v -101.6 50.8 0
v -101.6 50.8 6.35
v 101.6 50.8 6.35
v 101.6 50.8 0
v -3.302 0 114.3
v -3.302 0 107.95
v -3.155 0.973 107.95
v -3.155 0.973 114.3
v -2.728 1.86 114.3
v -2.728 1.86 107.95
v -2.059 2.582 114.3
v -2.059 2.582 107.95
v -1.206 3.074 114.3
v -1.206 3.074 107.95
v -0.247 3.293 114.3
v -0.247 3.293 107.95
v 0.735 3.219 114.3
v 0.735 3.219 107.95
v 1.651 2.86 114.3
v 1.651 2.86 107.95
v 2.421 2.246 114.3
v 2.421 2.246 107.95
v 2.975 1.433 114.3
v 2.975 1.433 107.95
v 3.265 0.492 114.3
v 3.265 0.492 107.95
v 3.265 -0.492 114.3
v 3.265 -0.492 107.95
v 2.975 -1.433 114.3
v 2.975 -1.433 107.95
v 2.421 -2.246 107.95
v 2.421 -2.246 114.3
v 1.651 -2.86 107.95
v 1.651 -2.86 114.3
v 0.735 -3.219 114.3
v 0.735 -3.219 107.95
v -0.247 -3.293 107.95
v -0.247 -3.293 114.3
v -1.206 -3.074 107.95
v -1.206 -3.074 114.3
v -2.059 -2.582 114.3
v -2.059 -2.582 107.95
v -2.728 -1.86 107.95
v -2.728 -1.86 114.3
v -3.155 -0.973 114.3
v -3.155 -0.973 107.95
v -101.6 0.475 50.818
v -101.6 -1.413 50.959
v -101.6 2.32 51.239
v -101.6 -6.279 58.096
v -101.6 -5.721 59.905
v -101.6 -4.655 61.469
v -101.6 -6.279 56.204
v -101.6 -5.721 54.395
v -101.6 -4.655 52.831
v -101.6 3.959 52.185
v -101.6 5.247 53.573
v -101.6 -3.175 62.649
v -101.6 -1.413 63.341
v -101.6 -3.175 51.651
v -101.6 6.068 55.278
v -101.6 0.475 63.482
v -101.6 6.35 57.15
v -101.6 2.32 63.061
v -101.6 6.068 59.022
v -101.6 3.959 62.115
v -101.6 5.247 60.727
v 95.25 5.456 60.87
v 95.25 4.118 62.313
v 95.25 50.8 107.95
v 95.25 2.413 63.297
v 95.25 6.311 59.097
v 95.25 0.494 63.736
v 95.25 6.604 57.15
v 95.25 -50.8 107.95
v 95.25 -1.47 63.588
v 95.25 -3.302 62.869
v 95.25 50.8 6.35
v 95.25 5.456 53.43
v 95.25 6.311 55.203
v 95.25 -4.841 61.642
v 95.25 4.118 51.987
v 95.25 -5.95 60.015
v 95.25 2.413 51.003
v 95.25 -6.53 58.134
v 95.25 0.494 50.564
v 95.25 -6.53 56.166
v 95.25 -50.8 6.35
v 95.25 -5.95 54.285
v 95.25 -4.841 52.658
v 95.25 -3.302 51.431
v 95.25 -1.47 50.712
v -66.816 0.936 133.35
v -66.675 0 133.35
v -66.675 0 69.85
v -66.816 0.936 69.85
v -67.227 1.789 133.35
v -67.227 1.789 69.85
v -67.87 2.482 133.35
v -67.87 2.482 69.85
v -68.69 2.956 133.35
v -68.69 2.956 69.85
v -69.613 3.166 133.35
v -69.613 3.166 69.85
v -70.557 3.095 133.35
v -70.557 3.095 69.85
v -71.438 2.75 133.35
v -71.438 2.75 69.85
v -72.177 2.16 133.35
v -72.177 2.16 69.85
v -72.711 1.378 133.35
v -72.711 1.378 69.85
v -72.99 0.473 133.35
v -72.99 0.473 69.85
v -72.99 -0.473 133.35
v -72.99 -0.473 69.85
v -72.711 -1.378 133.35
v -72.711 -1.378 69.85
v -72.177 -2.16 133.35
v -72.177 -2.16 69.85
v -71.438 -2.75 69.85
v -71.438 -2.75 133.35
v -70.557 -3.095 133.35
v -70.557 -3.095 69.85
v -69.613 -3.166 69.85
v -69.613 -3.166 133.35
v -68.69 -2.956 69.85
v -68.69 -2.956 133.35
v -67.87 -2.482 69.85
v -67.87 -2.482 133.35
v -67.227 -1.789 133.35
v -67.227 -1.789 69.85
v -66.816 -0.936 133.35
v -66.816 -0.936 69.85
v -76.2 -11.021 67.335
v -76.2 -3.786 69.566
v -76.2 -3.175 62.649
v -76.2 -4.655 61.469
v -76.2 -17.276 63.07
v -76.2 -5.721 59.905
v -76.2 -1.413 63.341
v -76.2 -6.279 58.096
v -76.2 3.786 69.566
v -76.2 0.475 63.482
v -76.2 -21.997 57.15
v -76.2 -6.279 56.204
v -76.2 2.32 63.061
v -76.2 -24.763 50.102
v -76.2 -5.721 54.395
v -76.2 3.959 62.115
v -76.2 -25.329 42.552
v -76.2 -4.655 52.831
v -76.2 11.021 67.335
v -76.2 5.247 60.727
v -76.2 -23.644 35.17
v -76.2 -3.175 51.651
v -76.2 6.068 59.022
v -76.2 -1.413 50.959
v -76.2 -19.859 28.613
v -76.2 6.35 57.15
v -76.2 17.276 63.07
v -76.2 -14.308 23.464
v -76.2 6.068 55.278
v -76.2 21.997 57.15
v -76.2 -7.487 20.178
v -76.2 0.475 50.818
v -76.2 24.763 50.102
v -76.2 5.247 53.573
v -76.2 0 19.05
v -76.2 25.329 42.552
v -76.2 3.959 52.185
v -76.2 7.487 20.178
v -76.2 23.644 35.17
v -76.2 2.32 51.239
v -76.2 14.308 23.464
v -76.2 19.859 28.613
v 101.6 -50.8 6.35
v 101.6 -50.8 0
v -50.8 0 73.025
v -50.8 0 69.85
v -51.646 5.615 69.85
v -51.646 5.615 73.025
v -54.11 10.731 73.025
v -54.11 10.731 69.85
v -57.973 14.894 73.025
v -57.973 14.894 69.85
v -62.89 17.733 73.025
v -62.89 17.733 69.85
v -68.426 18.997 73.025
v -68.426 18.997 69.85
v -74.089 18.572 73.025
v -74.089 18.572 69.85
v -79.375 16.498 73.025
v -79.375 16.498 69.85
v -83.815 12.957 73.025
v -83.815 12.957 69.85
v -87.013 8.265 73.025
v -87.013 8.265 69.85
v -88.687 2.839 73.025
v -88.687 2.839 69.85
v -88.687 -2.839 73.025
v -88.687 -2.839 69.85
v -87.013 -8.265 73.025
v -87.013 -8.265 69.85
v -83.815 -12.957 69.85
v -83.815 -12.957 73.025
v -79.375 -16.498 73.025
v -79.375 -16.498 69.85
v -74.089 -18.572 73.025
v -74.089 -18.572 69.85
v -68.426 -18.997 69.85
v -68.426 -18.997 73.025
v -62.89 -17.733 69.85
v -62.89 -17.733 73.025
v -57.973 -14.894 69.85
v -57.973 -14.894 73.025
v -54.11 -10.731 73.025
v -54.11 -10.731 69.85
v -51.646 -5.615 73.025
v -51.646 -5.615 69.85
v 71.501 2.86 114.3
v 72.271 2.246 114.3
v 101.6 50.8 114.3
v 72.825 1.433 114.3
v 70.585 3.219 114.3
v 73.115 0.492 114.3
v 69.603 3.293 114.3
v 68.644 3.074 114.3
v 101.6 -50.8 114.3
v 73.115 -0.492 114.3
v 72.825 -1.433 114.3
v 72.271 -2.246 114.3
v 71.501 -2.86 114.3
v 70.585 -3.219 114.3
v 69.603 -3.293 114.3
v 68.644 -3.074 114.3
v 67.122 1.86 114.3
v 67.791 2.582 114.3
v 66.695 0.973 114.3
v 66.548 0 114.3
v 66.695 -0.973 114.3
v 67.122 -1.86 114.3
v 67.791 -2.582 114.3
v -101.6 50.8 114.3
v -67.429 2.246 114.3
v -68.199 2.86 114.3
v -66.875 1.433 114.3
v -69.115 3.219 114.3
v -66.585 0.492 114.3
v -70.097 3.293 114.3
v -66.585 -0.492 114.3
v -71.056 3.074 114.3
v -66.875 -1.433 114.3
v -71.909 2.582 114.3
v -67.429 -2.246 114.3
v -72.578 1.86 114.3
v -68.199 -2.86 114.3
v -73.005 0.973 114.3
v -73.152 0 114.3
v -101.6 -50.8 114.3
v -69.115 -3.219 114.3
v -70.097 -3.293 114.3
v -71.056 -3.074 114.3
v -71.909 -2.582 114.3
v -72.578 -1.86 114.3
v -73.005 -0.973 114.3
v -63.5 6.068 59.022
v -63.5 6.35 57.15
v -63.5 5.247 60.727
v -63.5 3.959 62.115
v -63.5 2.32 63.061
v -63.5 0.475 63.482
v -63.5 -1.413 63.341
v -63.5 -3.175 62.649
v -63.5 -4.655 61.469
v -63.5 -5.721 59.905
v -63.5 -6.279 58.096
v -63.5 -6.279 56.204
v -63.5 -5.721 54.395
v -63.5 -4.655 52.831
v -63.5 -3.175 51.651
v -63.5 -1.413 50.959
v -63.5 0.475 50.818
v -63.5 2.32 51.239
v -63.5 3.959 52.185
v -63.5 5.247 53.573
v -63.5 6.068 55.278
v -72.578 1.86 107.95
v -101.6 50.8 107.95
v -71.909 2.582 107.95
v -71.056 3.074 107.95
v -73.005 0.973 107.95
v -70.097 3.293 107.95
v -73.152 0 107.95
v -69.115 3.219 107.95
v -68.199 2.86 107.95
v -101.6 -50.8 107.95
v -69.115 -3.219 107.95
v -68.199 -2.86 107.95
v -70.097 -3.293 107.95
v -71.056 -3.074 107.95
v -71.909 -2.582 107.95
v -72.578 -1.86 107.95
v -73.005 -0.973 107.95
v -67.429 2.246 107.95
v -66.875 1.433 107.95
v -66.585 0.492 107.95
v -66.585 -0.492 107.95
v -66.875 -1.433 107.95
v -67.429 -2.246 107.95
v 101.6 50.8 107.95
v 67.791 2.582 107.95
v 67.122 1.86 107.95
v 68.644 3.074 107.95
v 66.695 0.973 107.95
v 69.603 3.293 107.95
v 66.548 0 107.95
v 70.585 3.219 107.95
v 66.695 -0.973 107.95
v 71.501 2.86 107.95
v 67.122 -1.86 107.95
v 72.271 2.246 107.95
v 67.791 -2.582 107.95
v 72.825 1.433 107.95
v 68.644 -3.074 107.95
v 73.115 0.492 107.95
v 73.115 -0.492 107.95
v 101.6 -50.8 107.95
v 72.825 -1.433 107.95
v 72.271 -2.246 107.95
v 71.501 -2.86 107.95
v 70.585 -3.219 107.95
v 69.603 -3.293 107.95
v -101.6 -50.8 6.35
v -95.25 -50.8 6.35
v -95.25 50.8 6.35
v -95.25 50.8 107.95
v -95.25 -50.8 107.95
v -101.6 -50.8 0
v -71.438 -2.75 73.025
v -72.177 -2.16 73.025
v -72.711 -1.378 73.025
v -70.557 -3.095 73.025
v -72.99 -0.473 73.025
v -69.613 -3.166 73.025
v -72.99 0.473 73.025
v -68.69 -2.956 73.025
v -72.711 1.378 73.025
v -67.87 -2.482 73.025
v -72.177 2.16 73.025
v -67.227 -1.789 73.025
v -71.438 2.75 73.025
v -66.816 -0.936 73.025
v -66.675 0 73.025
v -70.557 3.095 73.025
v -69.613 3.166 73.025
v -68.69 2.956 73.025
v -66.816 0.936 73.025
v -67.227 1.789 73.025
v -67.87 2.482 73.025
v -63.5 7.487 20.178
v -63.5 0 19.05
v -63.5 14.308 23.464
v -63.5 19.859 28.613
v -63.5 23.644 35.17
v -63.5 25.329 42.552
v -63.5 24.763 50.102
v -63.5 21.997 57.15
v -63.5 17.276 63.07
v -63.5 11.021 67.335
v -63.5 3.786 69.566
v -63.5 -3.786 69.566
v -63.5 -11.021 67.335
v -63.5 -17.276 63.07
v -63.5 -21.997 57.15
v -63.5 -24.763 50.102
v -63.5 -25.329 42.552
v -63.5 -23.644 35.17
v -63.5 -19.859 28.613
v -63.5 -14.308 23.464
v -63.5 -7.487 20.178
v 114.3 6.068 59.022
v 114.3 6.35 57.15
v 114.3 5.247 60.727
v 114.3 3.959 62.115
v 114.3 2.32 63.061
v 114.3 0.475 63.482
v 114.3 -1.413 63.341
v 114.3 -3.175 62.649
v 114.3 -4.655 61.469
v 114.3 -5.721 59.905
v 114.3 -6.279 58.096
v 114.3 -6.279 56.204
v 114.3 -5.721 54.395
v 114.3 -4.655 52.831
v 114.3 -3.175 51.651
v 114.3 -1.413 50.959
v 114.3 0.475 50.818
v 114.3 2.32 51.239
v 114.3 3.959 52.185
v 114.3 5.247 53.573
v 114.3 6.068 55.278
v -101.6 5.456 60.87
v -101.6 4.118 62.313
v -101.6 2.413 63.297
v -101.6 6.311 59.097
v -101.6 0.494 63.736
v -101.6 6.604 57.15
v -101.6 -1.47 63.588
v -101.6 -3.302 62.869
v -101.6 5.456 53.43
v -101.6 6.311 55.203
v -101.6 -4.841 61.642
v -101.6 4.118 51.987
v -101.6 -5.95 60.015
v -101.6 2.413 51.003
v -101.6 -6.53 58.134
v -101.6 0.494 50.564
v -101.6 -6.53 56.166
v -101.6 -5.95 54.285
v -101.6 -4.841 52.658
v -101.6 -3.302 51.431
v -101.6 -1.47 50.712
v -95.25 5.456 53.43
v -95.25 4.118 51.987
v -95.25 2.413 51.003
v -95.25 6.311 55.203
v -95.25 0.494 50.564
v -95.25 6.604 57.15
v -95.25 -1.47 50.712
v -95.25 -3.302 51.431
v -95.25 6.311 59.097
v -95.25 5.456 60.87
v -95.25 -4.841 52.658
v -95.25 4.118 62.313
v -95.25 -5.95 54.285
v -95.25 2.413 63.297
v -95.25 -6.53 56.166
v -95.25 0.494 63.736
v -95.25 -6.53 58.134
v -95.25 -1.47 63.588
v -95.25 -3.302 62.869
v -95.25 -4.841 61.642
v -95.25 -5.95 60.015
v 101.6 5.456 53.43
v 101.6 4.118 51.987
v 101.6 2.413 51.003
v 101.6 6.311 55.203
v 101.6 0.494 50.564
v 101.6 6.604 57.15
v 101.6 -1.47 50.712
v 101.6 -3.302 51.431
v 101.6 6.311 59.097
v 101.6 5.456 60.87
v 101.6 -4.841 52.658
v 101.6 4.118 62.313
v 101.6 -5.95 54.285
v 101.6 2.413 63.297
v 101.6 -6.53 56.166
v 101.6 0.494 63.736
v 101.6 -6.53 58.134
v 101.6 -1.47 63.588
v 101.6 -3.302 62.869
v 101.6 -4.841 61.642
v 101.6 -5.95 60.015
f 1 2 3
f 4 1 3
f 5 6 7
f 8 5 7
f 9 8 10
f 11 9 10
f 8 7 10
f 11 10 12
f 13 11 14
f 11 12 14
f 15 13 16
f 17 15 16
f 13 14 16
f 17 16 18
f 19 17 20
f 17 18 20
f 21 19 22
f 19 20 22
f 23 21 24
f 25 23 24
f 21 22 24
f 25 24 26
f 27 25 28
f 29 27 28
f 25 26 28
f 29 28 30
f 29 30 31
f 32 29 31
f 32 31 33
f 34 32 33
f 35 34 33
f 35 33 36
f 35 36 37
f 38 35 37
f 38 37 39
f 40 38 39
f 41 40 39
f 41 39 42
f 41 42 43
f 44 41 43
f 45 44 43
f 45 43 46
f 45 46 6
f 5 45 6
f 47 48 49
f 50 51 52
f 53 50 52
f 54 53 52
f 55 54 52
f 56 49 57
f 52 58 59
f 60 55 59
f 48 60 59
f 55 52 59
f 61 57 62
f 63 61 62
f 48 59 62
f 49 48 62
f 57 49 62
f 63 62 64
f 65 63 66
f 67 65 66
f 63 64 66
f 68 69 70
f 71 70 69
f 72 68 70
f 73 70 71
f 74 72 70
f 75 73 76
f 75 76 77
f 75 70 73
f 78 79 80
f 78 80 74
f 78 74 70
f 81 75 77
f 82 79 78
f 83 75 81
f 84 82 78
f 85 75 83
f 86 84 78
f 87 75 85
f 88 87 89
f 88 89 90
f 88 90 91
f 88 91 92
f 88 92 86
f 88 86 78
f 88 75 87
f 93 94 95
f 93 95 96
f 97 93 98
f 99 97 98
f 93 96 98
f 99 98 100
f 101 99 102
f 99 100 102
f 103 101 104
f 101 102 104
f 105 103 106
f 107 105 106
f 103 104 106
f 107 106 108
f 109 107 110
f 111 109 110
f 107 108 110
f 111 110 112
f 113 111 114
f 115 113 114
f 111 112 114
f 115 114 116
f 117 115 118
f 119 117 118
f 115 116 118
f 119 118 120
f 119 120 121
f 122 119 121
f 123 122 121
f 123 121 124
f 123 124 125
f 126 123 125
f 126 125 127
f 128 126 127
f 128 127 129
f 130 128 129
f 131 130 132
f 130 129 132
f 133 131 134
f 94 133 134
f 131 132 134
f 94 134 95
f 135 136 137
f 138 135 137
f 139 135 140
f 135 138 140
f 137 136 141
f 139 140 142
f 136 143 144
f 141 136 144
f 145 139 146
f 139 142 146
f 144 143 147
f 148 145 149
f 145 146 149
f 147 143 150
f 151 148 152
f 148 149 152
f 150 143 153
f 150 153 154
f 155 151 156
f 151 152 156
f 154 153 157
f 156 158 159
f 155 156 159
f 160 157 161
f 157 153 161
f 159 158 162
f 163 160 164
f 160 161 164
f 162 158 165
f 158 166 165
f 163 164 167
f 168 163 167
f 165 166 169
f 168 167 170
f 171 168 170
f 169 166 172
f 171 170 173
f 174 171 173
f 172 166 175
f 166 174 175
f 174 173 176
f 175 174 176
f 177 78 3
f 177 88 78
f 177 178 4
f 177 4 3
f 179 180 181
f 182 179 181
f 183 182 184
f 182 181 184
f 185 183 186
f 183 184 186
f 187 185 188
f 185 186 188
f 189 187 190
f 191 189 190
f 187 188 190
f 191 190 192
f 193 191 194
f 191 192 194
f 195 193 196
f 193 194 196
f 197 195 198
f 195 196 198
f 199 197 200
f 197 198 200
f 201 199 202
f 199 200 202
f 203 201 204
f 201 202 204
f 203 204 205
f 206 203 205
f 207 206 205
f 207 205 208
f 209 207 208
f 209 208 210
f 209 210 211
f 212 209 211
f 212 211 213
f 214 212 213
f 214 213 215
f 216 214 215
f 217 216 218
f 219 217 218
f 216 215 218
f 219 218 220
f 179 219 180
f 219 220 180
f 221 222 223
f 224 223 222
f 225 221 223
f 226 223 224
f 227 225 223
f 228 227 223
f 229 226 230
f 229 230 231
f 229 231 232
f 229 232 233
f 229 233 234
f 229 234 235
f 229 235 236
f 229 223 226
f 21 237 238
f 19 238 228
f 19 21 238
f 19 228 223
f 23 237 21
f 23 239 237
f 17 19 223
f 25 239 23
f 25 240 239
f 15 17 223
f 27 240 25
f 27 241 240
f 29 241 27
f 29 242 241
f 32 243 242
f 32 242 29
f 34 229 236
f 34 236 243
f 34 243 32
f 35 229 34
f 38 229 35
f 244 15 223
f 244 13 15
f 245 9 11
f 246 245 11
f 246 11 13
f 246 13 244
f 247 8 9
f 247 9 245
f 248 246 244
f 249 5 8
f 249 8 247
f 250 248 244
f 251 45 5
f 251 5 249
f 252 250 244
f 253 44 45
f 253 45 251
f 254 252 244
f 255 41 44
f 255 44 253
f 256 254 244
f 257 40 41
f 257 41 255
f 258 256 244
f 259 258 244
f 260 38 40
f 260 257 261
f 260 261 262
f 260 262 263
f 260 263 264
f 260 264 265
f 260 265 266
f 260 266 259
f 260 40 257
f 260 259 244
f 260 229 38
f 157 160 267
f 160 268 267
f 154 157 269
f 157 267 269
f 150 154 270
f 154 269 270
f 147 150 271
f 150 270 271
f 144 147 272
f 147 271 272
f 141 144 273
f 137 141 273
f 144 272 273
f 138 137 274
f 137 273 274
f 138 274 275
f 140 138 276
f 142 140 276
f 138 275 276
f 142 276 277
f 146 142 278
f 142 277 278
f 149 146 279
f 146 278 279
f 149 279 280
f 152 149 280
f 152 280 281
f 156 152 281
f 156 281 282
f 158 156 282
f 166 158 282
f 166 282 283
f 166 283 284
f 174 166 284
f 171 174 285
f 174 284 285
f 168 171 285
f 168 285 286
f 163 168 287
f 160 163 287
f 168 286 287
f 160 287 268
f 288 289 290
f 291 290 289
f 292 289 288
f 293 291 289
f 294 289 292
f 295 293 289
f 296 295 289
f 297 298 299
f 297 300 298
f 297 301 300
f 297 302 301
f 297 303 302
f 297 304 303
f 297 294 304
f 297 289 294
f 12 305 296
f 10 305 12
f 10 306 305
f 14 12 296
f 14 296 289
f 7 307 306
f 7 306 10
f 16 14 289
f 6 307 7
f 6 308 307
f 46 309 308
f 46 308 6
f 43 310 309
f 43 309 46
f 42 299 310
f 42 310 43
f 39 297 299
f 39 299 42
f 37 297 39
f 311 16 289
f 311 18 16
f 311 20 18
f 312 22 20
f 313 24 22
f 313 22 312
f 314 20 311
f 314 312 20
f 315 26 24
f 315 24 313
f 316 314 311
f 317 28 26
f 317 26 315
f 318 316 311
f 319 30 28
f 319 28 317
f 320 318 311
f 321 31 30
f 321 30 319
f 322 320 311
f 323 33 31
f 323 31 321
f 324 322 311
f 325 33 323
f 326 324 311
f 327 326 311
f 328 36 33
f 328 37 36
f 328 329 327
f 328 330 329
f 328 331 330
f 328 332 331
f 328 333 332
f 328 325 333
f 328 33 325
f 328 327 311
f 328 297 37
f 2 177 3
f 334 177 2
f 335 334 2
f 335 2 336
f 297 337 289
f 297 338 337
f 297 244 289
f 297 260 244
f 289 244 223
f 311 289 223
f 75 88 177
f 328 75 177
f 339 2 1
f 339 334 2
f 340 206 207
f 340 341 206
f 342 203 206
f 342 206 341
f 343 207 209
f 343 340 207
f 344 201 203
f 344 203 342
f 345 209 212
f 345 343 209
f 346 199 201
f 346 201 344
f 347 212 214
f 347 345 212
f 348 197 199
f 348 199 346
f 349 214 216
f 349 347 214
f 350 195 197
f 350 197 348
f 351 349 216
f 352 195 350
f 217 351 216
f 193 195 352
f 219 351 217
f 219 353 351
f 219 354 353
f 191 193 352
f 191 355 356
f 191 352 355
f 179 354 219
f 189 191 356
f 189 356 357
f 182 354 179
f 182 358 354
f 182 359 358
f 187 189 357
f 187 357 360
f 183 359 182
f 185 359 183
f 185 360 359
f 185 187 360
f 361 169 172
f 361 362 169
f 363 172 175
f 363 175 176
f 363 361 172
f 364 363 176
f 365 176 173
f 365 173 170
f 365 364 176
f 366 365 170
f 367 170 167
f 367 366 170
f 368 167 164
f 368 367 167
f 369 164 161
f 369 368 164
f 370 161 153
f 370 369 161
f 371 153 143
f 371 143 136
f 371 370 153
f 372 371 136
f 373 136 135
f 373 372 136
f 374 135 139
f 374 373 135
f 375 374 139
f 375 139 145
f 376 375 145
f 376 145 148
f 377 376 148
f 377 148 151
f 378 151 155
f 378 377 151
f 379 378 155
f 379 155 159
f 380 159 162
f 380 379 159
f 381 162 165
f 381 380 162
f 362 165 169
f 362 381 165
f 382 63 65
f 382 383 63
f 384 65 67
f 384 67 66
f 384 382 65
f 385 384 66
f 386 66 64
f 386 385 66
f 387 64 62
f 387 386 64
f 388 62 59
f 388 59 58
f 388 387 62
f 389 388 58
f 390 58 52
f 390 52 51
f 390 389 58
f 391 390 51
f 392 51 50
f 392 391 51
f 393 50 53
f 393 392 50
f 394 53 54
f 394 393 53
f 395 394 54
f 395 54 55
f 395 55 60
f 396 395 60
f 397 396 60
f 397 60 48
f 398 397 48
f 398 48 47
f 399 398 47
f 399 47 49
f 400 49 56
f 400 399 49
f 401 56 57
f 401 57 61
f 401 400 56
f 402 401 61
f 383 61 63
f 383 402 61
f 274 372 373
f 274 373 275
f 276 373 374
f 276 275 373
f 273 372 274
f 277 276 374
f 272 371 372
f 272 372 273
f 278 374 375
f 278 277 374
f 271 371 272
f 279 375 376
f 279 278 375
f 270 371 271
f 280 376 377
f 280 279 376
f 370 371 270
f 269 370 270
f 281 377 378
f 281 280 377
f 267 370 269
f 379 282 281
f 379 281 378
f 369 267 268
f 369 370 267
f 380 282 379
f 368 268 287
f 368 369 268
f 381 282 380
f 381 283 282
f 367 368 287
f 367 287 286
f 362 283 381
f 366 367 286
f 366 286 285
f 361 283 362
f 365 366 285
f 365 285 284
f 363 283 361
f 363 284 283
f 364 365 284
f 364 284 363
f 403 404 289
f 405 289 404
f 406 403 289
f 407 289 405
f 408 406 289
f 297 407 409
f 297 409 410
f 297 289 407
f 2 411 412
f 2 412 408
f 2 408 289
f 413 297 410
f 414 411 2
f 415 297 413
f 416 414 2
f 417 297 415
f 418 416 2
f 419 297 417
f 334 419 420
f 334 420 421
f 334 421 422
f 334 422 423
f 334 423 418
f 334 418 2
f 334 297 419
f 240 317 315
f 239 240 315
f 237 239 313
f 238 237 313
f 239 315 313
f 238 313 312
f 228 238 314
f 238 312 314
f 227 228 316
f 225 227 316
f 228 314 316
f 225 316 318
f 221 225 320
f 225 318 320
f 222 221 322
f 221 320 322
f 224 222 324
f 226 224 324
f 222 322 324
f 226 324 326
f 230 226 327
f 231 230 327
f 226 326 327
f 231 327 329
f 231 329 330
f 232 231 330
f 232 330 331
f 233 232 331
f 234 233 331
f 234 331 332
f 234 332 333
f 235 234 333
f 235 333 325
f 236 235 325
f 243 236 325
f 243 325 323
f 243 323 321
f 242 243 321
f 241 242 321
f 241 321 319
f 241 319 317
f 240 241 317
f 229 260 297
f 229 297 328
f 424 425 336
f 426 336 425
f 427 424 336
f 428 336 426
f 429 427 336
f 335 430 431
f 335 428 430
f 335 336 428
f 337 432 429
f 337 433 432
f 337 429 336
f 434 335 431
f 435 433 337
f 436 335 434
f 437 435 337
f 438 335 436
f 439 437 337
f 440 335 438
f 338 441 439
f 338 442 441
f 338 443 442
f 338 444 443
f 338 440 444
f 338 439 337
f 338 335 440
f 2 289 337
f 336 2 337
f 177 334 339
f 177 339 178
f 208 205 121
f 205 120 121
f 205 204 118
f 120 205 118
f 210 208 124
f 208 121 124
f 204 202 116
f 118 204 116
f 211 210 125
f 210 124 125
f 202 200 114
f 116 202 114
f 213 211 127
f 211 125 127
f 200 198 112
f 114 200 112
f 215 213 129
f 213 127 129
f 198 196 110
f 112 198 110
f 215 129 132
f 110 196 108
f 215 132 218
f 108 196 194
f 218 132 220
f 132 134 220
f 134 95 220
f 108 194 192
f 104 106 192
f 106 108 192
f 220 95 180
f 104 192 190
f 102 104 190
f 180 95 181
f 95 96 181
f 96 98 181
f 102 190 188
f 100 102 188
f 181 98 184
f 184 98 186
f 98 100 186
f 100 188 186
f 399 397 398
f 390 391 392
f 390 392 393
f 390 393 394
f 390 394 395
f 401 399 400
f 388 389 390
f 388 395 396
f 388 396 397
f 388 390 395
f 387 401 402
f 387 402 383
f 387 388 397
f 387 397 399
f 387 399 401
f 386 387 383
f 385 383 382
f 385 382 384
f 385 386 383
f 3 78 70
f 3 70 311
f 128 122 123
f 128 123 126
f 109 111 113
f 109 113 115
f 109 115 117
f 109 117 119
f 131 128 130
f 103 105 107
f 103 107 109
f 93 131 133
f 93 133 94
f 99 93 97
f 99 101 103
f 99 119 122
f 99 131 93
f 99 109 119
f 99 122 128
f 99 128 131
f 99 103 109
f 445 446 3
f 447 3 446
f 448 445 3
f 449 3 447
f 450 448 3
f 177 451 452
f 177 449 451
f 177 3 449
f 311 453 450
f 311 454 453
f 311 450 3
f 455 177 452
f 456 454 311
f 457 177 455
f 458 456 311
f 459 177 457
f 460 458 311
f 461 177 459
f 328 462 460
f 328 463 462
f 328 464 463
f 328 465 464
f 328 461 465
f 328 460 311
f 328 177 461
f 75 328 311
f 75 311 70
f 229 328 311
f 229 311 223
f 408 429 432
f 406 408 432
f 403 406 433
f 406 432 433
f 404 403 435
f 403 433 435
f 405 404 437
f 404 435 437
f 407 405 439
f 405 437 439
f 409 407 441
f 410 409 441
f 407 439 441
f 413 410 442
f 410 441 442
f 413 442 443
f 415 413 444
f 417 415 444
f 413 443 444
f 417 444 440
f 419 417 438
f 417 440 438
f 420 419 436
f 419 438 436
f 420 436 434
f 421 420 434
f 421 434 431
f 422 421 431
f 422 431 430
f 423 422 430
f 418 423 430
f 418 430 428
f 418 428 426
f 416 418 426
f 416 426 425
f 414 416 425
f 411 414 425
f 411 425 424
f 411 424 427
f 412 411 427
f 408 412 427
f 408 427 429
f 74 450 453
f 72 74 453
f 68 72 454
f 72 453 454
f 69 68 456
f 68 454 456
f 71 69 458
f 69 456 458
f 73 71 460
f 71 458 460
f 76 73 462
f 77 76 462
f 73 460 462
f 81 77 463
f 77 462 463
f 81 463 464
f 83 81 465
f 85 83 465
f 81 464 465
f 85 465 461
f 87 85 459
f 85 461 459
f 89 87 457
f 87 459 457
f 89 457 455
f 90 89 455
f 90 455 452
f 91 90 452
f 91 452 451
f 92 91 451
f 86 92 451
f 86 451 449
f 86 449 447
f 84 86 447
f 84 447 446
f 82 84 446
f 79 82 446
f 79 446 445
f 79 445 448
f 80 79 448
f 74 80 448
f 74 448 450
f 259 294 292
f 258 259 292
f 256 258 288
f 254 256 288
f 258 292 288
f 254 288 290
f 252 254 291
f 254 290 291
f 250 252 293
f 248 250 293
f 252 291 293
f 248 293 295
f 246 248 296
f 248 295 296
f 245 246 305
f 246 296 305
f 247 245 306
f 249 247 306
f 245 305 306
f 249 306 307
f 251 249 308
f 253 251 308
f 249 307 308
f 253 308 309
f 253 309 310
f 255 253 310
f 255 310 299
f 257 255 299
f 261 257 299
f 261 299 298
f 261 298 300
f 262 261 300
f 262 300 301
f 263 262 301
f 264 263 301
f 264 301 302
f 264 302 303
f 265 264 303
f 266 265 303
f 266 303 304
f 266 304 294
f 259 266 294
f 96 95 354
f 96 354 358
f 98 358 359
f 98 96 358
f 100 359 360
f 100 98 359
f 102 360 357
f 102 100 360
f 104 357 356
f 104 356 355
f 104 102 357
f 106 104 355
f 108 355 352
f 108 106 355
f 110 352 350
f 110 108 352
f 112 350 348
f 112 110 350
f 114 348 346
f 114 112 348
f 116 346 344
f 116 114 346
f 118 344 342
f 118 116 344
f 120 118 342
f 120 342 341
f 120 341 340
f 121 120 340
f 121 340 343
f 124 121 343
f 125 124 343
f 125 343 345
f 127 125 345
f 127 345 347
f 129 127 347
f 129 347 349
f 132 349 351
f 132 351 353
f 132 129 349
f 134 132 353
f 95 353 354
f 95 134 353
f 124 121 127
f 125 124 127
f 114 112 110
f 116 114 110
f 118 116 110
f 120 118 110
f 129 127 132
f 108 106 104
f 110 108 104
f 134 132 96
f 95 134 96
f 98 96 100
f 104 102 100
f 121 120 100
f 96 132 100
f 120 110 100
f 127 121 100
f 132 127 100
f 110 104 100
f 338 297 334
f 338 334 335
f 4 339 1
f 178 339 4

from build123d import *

# Parameters (mm, degrees)
F2_DEPTH      = 50.8
F3_DEPTH      = 50.8
F3_DEPTH_BACK = 50.8
F4_R          = 6.604
F4_R_2        = 6.35
F5_DEPTH      = 203.201
F6_DEPTH      = 12.7
F6_DEPTH_BACK = 203.2
F1_W          = 12.7
F1_H          = 25.4
F10_D         = 6.604
F12_R         = 3.175
F13_DEPTH     = 63.5
F12_R_2       = 19.05
F14_DEPTH     = 3.175


with BuildPart() as f2:
    # F1 (on Front) → F2 (new body, symmetric)
    with BuildSketch(Plane.XZ):
        Polygon((-95.25, 6.35), (-101.6, 6.35), (-101.6, 0), (101.6, 0), (101.6, 6.35), (95.25, 6.35), align=None)
    extrude(amount=F2_DEPTH, both=True)


with BuildPart() as f2b:
    # F1 (on Front) → F2, piece 2 (new body, symmetric)
    with BuildSketch(Plane.XZ):
        Polygon((-101.6, 114.3), (-101.6, 107.95), (-95.25, 107.95), (95.25, 107.95), (101.6, 107.95), (101.6, 114.3), align=None)
    extrude(amount=F2_DEPTH, both=True)

    # F10 (through all)
    with Locations(Plane.XY.offset(114.3)):
        with Locations((-69.85, 0), (0, 0), (69.85, 0)):
            Hole(F10_D / 2)


with BuildPart() as f3:
    # F1 (on Front) → F3 (new body, two sides)
    with BuildSketch(Plane.XZ) as f3_sk:
        Polygon((-101.6, 107.95), (-101.6, 6.35), (-95.25, 6.35), (-95.25, 57.15), (-95.25, 107.95), align=None)
    extrude(amount=F3_DEPTH)
    extrude(f3_sk.sketch, amount=-F3_DEPTH_BACK)


with BuildPart() as f3b:
    # F1 (on Front) → F3, piece 2 (new body, two sides)
    with BuildSketch(Plane.XZ) as f3_2_sk:
        Polygon((95.25, 57.15), (95.25, 6.35), (101.6, 6.35), (101.6, 107.95), (95.25, 107.95), align=None)
    extrude(amount=F3_DEPTH)
    extrude(f3_2_sk.sketch, amount=-F3_DEPTH_BACK)


with BuildPart() as f5_tool:
    # F4 (on face) → F5 (new body, through all)
    with BuildSketch(Plane.YZ.offset(101.6)):
        with Locations((0, 57.15)):
            Circle(F4_R)
        with Locations((0, 57.15)):
            Circle(F4_R_2, mode=Mode.SUBTRACT)
        with Locations((0, 57.15)):
            Circle(F4_R_2)
    extrude(amount=-F5_DEPTH)


with BuildPart() as f3_1:
    add(f3.part)

    # F5: cut by f5_tool
    add(f5_tool.part, mode=Mode.SUBTRACT)


with BuildPart() as f3b_1:
    add(f3b.part)

    # F5: cut by f5_tool
    add(f5_tool.part, mode=Mode.SUBTRACT)


with BuildPart() as f6:
    # F4 (on face) → F6 (new body, two sides)
    with BuildSketch(Plane.YZ.offset(101.6)) as f6_sk:
        with Locations((0, 57.15)):
            Circle(F4_R_2)
    extrude(amount=F6_DEPTH)
    extrude(f6_sk.sketch, amount=-F6_DEPTH_BACK)


with BuildPart() as f7:
    # F1 (on Front) → F7 (revolve)
    with BuildSketch(Plane.XZ):
        with Locations((-69.85, 31.75)):
            Rectangle(F1_W, F1_H)
    revolve(axis=Axis((-69.85, 0, 44.45), (1, 0, 0)))

    # F8: cut F6
    add(f6.part, mode=Mode.SUBTRACT)


with BuildPart() as f13:
    # F12 (on plane+point) → F13 (new body, through all)
    with BuildSketch(Plane.XY.offset(69.85)):
        with Locations((-69.85, 0)):
            Circle(F12_R)
    extrude(amount=F13_DEPTH)


with BuildPart() as f14:
    # F12 (on plane+point) → F14 (new body)
    with BuildSketch(Plane.XY.offset(69.85)):
        with Locations((-69.85, 0)):
            Circle(F12_R_2)
        with Locations((-69.85, 0)):
            Circle(F12_R, mode=Mode.SUBTRACT)
    extrude(amount=F14_DEPTH)


solid = Compound([f2.part, f2b.part, f3_1.part, f3b_1.part, f6.part, f7.part, f13.part, f14.part])
